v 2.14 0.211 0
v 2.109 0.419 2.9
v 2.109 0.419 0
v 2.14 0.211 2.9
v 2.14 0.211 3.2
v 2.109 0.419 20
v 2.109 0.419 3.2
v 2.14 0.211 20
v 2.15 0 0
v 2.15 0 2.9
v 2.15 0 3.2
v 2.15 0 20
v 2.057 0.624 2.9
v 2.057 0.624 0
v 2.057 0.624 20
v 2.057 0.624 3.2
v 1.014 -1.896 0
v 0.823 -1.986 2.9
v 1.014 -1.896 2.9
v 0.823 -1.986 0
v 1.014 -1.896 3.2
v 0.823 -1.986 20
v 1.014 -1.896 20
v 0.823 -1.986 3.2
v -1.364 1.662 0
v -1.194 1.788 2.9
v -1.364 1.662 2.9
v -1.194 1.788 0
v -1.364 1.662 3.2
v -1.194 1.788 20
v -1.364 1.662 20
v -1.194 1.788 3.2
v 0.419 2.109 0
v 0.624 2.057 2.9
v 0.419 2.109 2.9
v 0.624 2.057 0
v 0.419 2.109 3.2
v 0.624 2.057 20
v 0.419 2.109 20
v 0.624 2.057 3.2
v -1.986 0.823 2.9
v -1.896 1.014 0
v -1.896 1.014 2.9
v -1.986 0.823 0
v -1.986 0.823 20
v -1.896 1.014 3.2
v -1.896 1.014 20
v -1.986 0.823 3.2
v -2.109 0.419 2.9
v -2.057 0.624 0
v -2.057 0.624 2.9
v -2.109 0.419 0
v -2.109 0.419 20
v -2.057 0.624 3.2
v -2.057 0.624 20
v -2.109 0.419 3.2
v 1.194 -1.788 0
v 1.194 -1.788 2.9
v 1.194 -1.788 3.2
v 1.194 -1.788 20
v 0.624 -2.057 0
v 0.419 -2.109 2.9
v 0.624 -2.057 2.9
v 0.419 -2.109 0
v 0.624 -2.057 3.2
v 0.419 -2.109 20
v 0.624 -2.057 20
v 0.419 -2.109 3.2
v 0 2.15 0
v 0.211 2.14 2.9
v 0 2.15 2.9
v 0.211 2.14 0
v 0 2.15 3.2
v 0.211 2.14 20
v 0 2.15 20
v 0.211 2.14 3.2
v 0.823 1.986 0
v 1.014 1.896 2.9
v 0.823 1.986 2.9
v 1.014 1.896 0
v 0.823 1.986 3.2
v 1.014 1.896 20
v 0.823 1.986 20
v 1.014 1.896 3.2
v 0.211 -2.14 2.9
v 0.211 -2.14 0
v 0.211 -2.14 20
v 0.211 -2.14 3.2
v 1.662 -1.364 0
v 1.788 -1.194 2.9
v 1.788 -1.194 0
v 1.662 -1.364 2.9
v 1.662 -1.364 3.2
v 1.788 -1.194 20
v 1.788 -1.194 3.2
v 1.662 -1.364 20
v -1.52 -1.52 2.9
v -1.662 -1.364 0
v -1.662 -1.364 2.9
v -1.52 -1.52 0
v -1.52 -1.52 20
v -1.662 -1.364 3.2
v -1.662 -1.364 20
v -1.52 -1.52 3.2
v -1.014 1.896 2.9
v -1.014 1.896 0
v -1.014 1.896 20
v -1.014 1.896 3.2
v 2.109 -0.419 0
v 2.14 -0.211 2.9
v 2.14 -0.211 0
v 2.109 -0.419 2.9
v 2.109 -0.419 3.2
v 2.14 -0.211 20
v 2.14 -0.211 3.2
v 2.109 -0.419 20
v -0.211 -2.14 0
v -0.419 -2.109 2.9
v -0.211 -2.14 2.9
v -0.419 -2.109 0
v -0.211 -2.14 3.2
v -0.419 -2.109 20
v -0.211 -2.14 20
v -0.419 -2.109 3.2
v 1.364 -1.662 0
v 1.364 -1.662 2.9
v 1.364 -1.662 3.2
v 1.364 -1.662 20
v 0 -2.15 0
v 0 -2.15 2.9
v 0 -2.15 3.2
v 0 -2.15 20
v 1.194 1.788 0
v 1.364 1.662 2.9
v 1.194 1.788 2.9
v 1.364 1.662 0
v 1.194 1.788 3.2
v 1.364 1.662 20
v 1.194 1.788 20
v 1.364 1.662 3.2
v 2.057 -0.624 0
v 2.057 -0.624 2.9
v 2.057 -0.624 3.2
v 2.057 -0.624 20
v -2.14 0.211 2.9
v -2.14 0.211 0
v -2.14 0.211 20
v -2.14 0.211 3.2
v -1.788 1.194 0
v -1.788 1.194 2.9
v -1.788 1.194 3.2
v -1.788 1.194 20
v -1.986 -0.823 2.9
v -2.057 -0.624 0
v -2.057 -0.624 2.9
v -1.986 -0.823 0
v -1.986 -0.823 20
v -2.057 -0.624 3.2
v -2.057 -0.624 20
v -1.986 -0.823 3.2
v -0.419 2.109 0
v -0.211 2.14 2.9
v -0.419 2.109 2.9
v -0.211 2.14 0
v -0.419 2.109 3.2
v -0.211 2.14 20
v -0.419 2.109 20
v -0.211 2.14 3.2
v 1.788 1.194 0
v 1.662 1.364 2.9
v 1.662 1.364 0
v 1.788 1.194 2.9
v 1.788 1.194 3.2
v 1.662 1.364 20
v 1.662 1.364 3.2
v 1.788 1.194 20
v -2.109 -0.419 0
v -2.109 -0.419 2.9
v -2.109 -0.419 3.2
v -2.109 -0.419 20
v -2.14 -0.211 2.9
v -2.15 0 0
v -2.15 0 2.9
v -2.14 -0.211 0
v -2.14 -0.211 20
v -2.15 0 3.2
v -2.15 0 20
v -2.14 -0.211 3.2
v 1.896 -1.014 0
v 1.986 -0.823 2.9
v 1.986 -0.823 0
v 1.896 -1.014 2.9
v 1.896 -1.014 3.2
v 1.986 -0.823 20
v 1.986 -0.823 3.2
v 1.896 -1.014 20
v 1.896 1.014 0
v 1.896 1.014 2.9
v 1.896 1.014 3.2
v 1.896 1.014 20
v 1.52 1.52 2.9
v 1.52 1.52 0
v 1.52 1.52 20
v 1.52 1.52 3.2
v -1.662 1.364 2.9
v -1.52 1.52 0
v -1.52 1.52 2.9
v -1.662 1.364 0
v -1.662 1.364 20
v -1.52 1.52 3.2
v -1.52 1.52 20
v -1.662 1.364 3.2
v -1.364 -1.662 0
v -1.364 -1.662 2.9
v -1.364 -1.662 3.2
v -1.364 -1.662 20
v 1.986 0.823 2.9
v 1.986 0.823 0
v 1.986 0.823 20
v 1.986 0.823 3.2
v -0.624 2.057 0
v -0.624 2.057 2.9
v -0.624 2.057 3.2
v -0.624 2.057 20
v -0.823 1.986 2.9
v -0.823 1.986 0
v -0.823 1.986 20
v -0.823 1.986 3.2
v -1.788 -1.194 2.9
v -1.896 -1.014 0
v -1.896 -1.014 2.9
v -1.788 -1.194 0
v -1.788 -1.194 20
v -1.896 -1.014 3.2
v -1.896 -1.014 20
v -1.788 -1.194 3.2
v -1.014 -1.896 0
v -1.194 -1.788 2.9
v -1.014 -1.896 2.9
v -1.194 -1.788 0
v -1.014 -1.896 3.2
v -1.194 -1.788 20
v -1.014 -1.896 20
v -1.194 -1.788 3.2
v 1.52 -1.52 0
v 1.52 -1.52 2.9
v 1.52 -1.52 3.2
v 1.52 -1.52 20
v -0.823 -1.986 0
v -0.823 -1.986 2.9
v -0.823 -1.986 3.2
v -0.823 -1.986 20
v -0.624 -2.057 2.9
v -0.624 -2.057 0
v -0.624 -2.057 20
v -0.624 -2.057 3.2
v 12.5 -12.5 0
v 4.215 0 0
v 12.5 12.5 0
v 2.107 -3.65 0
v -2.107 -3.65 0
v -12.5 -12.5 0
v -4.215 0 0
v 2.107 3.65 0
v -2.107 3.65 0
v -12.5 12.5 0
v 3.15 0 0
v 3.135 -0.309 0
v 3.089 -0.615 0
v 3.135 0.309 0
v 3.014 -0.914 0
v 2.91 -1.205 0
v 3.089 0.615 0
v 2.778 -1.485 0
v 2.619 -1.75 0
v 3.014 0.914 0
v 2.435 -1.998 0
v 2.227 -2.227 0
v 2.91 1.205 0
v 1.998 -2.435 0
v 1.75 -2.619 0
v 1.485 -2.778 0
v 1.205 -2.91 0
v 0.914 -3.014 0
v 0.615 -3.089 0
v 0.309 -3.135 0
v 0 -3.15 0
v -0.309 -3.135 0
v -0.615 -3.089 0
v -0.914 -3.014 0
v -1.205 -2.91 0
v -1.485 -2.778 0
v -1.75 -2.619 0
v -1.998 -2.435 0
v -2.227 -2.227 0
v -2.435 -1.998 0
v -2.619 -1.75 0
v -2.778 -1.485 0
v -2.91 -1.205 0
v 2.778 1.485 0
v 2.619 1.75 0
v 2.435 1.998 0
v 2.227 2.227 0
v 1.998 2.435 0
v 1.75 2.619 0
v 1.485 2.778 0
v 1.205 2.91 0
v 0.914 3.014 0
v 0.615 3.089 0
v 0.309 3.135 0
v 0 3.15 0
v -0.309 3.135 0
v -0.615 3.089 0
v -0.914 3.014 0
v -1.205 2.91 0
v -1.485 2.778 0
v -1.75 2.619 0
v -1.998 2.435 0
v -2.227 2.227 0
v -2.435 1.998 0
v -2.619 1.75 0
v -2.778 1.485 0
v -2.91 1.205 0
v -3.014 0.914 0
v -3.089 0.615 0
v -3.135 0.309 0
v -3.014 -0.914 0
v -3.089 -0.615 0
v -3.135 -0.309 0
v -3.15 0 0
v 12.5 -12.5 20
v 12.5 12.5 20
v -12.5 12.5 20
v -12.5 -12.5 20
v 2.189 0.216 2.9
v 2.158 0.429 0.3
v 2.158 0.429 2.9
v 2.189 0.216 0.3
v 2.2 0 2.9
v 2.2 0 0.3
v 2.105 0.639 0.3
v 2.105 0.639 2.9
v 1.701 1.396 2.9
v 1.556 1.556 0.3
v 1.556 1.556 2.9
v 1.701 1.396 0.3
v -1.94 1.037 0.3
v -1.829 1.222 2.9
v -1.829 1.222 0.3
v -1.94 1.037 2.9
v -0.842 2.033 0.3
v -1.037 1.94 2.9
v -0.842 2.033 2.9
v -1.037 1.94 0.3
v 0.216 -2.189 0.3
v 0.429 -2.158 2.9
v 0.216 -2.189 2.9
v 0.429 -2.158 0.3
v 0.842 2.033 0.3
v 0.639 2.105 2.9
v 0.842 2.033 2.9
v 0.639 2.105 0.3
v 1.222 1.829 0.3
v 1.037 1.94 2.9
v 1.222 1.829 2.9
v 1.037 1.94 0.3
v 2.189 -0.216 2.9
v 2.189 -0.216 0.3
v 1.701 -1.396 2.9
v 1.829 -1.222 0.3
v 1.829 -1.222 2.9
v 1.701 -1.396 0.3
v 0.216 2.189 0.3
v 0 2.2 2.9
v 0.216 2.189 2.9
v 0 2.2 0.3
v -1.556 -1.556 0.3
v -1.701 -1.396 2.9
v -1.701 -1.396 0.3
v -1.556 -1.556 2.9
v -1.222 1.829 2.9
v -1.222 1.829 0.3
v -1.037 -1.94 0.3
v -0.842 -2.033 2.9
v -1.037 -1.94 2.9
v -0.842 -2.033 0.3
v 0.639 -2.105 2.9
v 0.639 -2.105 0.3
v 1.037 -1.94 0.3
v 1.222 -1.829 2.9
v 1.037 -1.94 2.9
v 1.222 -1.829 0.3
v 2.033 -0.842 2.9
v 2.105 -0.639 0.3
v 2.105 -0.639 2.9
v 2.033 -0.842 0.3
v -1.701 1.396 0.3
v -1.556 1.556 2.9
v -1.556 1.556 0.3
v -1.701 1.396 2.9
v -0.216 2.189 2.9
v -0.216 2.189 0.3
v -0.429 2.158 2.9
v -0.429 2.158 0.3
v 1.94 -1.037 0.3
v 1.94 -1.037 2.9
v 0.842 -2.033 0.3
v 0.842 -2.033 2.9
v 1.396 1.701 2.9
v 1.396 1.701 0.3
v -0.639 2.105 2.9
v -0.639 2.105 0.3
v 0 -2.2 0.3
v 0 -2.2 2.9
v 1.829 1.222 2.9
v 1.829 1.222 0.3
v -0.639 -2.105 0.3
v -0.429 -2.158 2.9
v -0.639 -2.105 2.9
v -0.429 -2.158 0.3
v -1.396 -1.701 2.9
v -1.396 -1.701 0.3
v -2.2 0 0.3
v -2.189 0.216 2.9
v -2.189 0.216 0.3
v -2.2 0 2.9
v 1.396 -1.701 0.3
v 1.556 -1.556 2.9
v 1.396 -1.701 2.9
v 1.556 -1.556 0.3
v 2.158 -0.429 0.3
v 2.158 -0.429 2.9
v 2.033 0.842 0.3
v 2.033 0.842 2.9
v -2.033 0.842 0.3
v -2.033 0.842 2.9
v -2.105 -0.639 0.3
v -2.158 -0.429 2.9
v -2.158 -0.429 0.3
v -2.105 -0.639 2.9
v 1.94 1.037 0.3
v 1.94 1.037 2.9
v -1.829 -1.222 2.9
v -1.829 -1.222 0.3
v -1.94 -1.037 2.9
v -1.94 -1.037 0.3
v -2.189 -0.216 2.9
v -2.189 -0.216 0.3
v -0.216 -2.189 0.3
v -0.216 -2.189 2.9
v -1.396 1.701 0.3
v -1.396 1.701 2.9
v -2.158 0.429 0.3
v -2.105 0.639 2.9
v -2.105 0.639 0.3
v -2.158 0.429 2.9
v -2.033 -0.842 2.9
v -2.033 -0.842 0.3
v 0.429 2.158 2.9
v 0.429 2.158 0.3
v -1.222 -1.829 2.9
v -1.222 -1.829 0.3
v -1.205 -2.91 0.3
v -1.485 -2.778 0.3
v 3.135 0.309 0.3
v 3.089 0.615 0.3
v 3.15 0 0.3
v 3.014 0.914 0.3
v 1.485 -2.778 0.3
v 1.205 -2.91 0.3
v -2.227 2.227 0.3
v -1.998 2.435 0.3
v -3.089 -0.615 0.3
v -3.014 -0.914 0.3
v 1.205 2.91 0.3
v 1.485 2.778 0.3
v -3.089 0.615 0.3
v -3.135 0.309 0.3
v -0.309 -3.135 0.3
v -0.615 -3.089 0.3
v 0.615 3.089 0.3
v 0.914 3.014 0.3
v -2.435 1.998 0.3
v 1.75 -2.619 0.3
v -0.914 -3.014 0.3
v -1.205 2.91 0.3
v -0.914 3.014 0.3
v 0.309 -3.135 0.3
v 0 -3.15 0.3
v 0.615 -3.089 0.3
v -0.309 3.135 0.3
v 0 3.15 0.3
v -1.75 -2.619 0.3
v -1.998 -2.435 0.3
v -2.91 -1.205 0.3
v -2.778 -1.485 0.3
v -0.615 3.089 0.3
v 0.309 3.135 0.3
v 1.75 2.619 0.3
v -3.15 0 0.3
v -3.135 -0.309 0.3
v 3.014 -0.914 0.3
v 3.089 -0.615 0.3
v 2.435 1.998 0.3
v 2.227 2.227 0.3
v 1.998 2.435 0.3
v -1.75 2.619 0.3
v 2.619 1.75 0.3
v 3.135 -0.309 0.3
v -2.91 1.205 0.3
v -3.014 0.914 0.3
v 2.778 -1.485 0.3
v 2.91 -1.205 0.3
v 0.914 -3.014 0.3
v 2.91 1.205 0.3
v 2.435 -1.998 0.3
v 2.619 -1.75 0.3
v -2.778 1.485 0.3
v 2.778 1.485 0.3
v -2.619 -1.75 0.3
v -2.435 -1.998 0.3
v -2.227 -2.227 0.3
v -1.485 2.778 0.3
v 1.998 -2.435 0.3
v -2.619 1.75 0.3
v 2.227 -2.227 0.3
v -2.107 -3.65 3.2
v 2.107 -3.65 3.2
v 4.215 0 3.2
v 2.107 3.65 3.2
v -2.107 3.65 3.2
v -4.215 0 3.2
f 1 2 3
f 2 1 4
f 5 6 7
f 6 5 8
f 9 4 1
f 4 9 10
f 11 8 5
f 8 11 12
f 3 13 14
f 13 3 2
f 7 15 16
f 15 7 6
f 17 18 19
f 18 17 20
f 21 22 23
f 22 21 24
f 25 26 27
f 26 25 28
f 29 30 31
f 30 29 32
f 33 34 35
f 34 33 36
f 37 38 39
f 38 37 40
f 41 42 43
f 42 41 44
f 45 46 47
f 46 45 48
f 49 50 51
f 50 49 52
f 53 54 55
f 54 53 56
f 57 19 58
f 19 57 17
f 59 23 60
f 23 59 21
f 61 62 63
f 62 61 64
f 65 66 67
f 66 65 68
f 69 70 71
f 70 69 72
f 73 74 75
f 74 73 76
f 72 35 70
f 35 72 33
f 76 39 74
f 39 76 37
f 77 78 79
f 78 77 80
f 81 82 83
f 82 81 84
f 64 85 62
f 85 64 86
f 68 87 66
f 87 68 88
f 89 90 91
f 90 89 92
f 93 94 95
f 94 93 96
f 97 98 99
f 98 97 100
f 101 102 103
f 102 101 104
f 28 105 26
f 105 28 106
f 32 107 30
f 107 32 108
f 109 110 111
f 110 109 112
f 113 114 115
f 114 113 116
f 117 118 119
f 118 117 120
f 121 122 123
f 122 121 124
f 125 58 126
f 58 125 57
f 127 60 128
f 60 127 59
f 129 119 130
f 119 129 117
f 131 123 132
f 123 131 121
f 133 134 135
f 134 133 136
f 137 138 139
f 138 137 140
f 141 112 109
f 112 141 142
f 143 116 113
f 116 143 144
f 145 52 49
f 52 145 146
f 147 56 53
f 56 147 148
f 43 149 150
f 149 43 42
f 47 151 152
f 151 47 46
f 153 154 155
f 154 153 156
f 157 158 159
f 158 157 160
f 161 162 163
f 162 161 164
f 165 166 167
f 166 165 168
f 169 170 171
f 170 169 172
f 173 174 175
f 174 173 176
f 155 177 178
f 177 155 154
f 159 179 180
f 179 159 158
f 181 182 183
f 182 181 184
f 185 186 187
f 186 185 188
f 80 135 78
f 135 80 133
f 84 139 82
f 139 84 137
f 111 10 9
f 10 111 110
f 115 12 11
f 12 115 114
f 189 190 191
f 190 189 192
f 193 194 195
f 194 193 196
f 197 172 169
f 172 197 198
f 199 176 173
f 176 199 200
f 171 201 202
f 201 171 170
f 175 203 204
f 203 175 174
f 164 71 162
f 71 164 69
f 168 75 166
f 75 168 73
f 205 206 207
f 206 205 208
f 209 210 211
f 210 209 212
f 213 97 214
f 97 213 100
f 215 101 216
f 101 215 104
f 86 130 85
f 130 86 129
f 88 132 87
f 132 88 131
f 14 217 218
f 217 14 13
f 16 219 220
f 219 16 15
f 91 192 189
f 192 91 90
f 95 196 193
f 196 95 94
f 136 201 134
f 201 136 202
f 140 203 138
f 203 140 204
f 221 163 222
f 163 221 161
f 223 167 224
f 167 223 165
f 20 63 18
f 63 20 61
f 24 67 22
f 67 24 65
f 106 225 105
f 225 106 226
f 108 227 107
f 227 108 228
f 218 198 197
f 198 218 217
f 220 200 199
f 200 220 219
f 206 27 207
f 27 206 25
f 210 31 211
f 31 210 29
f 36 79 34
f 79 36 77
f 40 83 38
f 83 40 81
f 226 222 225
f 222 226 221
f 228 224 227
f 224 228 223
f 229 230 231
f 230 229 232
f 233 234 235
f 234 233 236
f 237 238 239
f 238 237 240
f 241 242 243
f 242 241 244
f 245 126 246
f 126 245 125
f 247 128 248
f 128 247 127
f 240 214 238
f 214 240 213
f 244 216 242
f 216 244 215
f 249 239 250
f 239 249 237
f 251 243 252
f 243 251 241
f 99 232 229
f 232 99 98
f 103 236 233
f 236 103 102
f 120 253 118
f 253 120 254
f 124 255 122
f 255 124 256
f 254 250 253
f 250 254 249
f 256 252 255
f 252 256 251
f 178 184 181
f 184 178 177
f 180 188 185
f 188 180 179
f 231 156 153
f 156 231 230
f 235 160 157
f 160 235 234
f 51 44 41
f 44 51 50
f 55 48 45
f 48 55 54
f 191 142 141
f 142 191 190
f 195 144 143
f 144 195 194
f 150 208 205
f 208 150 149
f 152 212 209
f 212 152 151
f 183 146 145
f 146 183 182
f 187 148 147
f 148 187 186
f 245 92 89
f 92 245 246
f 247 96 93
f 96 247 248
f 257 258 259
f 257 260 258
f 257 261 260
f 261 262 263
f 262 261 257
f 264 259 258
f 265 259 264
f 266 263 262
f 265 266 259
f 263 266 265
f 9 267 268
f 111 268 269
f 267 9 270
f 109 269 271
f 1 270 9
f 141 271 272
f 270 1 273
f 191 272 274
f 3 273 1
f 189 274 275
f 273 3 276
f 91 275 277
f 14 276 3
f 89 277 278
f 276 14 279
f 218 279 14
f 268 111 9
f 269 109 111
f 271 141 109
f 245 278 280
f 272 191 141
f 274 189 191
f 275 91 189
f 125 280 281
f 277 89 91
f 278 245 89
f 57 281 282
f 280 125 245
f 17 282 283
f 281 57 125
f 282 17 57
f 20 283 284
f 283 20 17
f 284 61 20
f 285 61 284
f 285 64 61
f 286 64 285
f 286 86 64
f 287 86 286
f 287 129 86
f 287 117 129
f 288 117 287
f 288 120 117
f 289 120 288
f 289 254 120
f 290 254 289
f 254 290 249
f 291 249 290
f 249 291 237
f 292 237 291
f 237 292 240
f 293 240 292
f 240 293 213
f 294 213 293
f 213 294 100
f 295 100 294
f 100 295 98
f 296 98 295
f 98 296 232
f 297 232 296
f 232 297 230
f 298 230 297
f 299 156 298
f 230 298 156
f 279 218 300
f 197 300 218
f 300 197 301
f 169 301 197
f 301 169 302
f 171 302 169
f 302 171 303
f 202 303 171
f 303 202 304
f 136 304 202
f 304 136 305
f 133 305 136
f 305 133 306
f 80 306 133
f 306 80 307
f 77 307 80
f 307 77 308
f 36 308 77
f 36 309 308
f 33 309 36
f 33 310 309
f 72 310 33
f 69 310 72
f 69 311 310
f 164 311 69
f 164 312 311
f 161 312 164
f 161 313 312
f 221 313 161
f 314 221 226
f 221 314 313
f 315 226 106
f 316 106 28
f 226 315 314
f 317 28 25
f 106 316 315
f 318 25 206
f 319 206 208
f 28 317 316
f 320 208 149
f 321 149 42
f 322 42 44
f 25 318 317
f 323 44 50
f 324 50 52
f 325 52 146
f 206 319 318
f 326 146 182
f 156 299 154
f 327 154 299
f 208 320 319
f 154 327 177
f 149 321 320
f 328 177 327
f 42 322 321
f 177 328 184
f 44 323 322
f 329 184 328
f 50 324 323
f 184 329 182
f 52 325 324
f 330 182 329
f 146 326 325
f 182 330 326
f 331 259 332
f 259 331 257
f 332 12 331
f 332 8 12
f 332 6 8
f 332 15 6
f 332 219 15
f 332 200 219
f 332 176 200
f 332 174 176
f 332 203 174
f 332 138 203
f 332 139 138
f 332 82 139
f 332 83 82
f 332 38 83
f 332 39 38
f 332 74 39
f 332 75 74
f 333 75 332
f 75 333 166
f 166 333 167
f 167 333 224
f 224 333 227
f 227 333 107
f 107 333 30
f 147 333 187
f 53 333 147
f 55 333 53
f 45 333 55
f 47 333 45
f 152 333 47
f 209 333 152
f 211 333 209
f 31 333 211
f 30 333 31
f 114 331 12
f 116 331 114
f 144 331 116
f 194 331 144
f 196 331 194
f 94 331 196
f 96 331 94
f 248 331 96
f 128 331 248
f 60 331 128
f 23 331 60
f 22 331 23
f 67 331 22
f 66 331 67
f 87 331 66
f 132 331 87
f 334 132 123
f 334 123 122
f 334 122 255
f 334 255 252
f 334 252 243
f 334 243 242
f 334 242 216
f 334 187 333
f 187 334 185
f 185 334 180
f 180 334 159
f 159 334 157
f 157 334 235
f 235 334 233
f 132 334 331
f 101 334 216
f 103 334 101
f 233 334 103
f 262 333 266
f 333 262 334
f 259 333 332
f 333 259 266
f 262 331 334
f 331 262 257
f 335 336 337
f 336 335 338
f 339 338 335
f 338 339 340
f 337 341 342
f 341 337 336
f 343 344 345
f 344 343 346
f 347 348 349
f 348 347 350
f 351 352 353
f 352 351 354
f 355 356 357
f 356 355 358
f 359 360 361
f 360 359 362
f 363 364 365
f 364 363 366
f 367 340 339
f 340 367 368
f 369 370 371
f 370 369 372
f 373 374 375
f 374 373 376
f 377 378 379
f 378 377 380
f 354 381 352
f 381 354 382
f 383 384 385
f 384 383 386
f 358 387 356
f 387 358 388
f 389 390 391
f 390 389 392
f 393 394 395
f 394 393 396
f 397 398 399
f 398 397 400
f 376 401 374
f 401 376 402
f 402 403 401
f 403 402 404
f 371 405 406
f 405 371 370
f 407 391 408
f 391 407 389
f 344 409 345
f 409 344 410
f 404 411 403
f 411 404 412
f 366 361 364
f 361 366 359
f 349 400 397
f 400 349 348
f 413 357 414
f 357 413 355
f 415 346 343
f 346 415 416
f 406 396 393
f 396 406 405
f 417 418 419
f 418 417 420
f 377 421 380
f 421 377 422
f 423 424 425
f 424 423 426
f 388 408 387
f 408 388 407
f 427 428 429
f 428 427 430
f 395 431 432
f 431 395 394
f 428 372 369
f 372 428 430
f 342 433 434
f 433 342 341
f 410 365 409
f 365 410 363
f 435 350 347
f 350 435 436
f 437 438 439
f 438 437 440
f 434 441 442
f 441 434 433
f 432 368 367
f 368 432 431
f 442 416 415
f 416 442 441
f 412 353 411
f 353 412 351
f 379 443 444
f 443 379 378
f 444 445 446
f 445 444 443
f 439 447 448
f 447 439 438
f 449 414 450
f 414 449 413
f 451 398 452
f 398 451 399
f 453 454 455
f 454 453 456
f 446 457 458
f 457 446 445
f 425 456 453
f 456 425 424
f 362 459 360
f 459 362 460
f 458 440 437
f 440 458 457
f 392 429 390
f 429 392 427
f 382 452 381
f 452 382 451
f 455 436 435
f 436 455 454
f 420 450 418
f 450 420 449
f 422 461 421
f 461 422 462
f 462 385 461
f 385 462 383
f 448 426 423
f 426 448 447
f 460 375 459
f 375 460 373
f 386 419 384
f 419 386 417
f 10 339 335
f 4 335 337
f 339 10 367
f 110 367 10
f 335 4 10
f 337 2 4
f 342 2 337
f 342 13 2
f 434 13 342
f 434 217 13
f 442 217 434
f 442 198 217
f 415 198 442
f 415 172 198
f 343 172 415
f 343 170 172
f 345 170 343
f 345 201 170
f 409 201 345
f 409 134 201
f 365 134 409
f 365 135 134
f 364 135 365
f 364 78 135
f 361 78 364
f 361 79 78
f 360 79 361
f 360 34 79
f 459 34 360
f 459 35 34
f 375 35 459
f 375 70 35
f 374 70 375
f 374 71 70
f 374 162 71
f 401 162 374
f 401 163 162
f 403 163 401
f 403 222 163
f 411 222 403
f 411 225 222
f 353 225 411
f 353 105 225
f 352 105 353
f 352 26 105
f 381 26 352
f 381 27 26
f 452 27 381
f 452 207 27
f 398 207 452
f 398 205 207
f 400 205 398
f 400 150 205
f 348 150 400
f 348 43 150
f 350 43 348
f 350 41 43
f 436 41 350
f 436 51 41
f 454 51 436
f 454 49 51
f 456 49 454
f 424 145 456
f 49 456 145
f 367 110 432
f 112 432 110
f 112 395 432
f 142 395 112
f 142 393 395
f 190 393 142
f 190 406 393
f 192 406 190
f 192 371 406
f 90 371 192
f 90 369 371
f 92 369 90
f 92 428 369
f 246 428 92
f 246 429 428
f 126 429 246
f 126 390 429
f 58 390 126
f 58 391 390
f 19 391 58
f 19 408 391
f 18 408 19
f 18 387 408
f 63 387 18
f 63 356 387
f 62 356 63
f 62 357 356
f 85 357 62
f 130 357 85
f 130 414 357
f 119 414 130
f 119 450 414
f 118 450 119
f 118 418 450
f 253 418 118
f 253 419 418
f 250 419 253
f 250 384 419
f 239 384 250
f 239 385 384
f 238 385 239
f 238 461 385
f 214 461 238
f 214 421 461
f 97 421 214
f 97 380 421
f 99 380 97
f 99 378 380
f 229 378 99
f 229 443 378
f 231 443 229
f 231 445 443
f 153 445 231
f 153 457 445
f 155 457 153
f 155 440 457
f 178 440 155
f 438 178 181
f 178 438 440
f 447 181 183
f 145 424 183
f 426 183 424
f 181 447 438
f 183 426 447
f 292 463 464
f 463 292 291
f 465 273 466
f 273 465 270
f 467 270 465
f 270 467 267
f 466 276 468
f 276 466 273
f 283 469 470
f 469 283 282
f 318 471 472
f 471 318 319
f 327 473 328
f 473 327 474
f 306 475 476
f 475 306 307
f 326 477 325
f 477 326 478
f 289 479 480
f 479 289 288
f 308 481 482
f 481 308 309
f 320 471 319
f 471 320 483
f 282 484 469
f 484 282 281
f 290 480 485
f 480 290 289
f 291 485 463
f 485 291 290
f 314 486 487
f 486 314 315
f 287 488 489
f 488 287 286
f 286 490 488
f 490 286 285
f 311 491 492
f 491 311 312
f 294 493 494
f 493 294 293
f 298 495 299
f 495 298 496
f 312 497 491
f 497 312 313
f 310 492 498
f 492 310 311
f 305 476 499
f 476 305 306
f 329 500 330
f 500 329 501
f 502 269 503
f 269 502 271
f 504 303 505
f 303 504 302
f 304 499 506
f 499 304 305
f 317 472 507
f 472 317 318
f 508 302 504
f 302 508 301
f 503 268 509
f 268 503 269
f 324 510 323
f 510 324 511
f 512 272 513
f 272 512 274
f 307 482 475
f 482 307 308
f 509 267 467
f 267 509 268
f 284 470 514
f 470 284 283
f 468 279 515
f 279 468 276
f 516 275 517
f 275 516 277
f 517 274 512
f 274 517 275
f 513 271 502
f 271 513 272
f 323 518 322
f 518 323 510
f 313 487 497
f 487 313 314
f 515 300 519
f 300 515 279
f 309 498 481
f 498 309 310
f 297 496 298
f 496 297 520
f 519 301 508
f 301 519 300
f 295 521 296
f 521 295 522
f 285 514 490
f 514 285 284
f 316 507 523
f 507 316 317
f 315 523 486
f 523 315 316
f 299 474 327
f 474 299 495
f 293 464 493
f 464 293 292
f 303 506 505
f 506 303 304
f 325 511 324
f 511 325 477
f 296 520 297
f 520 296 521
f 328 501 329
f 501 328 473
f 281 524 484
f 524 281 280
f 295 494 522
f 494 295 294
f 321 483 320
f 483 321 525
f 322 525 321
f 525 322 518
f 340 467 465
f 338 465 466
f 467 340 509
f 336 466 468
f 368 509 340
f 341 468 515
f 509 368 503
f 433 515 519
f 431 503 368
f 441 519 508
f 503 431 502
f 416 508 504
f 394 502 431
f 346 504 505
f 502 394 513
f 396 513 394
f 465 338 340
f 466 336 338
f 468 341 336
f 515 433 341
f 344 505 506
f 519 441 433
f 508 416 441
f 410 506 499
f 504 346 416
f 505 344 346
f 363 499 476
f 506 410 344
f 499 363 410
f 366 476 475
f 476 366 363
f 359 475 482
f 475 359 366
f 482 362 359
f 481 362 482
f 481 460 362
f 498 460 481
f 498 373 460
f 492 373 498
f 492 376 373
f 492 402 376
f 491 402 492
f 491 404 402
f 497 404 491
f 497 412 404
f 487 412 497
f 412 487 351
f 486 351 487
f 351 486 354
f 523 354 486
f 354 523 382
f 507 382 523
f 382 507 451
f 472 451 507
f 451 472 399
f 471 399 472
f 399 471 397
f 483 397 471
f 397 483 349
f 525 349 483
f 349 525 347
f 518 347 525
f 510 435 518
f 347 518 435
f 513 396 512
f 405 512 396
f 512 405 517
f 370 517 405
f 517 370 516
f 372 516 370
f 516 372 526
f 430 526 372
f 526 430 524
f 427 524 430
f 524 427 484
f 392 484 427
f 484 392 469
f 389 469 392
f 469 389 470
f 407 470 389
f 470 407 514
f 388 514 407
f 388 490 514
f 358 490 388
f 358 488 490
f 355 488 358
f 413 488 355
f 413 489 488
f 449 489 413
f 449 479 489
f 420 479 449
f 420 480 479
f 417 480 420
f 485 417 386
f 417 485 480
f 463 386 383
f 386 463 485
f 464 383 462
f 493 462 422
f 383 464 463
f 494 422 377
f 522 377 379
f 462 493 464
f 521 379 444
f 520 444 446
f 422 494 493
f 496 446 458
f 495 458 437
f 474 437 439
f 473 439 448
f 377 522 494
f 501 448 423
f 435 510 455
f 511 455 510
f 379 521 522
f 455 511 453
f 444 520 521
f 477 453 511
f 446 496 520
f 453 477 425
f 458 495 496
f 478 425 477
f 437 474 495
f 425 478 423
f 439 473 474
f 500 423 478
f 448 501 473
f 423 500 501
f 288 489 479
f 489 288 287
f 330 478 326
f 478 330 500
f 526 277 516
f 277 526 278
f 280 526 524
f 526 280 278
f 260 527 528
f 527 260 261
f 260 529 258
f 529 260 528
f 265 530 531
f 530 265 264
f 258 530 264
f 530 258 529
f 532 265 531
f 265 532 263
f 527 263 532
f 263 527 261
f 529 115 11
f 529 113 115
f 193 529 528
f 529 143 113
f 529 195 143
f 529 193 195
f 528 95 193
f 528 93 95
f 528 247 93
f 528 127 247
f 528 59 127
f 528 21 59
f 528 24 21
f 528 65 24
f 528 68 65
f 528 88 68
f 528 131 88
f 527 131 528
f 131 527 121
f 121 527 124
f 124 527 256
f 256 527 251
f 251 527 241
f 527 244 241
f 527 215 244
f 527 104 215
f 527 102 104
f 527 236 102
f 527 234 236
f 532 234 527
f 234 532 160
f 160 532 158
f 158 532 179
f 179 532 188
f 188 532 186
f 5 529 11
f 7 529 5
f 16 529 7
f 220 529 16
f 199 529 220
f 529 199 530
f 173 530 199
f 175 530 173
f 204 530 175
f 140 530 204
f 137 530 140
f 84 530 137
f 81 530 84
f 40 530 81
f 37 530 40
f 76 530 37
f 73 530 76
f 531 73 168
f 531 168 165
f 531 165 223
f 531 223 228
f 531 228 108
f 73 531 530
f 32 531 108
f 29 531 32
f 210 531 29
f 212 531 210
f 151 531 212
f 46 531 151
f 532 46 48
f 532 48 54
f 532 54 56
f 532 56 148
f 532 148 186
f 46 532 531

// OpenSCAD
$fn=64;
color("BurlyWood"){difference(){difference(){translate(v = [-12.5, -12.5])
cube(size = [25, 25, 20]);
translate(v = [0, 0, 40])
mirror(v = [0, 0, 1])
union(){color("Gainsboro"){translate(v = [0, 0, -4])
cylinder(h = 4, r = 3.500);
}
color("Gainsboro"){cylinder(h = 20, r = 2.150);
}
color("DarkGray"){translate(v = [0, 0, 20])
cylinder(h = 20, r = 2.150);
}
}
}
color("Gainsboro"){difference(){cylinder(h = 3.200, $fn = 6, r = 4.215);
union(){cylinder(h = 2.900, r = 2.200);
cylinder(h = 0.300, r = 3.150);
}
}
}
}
}
